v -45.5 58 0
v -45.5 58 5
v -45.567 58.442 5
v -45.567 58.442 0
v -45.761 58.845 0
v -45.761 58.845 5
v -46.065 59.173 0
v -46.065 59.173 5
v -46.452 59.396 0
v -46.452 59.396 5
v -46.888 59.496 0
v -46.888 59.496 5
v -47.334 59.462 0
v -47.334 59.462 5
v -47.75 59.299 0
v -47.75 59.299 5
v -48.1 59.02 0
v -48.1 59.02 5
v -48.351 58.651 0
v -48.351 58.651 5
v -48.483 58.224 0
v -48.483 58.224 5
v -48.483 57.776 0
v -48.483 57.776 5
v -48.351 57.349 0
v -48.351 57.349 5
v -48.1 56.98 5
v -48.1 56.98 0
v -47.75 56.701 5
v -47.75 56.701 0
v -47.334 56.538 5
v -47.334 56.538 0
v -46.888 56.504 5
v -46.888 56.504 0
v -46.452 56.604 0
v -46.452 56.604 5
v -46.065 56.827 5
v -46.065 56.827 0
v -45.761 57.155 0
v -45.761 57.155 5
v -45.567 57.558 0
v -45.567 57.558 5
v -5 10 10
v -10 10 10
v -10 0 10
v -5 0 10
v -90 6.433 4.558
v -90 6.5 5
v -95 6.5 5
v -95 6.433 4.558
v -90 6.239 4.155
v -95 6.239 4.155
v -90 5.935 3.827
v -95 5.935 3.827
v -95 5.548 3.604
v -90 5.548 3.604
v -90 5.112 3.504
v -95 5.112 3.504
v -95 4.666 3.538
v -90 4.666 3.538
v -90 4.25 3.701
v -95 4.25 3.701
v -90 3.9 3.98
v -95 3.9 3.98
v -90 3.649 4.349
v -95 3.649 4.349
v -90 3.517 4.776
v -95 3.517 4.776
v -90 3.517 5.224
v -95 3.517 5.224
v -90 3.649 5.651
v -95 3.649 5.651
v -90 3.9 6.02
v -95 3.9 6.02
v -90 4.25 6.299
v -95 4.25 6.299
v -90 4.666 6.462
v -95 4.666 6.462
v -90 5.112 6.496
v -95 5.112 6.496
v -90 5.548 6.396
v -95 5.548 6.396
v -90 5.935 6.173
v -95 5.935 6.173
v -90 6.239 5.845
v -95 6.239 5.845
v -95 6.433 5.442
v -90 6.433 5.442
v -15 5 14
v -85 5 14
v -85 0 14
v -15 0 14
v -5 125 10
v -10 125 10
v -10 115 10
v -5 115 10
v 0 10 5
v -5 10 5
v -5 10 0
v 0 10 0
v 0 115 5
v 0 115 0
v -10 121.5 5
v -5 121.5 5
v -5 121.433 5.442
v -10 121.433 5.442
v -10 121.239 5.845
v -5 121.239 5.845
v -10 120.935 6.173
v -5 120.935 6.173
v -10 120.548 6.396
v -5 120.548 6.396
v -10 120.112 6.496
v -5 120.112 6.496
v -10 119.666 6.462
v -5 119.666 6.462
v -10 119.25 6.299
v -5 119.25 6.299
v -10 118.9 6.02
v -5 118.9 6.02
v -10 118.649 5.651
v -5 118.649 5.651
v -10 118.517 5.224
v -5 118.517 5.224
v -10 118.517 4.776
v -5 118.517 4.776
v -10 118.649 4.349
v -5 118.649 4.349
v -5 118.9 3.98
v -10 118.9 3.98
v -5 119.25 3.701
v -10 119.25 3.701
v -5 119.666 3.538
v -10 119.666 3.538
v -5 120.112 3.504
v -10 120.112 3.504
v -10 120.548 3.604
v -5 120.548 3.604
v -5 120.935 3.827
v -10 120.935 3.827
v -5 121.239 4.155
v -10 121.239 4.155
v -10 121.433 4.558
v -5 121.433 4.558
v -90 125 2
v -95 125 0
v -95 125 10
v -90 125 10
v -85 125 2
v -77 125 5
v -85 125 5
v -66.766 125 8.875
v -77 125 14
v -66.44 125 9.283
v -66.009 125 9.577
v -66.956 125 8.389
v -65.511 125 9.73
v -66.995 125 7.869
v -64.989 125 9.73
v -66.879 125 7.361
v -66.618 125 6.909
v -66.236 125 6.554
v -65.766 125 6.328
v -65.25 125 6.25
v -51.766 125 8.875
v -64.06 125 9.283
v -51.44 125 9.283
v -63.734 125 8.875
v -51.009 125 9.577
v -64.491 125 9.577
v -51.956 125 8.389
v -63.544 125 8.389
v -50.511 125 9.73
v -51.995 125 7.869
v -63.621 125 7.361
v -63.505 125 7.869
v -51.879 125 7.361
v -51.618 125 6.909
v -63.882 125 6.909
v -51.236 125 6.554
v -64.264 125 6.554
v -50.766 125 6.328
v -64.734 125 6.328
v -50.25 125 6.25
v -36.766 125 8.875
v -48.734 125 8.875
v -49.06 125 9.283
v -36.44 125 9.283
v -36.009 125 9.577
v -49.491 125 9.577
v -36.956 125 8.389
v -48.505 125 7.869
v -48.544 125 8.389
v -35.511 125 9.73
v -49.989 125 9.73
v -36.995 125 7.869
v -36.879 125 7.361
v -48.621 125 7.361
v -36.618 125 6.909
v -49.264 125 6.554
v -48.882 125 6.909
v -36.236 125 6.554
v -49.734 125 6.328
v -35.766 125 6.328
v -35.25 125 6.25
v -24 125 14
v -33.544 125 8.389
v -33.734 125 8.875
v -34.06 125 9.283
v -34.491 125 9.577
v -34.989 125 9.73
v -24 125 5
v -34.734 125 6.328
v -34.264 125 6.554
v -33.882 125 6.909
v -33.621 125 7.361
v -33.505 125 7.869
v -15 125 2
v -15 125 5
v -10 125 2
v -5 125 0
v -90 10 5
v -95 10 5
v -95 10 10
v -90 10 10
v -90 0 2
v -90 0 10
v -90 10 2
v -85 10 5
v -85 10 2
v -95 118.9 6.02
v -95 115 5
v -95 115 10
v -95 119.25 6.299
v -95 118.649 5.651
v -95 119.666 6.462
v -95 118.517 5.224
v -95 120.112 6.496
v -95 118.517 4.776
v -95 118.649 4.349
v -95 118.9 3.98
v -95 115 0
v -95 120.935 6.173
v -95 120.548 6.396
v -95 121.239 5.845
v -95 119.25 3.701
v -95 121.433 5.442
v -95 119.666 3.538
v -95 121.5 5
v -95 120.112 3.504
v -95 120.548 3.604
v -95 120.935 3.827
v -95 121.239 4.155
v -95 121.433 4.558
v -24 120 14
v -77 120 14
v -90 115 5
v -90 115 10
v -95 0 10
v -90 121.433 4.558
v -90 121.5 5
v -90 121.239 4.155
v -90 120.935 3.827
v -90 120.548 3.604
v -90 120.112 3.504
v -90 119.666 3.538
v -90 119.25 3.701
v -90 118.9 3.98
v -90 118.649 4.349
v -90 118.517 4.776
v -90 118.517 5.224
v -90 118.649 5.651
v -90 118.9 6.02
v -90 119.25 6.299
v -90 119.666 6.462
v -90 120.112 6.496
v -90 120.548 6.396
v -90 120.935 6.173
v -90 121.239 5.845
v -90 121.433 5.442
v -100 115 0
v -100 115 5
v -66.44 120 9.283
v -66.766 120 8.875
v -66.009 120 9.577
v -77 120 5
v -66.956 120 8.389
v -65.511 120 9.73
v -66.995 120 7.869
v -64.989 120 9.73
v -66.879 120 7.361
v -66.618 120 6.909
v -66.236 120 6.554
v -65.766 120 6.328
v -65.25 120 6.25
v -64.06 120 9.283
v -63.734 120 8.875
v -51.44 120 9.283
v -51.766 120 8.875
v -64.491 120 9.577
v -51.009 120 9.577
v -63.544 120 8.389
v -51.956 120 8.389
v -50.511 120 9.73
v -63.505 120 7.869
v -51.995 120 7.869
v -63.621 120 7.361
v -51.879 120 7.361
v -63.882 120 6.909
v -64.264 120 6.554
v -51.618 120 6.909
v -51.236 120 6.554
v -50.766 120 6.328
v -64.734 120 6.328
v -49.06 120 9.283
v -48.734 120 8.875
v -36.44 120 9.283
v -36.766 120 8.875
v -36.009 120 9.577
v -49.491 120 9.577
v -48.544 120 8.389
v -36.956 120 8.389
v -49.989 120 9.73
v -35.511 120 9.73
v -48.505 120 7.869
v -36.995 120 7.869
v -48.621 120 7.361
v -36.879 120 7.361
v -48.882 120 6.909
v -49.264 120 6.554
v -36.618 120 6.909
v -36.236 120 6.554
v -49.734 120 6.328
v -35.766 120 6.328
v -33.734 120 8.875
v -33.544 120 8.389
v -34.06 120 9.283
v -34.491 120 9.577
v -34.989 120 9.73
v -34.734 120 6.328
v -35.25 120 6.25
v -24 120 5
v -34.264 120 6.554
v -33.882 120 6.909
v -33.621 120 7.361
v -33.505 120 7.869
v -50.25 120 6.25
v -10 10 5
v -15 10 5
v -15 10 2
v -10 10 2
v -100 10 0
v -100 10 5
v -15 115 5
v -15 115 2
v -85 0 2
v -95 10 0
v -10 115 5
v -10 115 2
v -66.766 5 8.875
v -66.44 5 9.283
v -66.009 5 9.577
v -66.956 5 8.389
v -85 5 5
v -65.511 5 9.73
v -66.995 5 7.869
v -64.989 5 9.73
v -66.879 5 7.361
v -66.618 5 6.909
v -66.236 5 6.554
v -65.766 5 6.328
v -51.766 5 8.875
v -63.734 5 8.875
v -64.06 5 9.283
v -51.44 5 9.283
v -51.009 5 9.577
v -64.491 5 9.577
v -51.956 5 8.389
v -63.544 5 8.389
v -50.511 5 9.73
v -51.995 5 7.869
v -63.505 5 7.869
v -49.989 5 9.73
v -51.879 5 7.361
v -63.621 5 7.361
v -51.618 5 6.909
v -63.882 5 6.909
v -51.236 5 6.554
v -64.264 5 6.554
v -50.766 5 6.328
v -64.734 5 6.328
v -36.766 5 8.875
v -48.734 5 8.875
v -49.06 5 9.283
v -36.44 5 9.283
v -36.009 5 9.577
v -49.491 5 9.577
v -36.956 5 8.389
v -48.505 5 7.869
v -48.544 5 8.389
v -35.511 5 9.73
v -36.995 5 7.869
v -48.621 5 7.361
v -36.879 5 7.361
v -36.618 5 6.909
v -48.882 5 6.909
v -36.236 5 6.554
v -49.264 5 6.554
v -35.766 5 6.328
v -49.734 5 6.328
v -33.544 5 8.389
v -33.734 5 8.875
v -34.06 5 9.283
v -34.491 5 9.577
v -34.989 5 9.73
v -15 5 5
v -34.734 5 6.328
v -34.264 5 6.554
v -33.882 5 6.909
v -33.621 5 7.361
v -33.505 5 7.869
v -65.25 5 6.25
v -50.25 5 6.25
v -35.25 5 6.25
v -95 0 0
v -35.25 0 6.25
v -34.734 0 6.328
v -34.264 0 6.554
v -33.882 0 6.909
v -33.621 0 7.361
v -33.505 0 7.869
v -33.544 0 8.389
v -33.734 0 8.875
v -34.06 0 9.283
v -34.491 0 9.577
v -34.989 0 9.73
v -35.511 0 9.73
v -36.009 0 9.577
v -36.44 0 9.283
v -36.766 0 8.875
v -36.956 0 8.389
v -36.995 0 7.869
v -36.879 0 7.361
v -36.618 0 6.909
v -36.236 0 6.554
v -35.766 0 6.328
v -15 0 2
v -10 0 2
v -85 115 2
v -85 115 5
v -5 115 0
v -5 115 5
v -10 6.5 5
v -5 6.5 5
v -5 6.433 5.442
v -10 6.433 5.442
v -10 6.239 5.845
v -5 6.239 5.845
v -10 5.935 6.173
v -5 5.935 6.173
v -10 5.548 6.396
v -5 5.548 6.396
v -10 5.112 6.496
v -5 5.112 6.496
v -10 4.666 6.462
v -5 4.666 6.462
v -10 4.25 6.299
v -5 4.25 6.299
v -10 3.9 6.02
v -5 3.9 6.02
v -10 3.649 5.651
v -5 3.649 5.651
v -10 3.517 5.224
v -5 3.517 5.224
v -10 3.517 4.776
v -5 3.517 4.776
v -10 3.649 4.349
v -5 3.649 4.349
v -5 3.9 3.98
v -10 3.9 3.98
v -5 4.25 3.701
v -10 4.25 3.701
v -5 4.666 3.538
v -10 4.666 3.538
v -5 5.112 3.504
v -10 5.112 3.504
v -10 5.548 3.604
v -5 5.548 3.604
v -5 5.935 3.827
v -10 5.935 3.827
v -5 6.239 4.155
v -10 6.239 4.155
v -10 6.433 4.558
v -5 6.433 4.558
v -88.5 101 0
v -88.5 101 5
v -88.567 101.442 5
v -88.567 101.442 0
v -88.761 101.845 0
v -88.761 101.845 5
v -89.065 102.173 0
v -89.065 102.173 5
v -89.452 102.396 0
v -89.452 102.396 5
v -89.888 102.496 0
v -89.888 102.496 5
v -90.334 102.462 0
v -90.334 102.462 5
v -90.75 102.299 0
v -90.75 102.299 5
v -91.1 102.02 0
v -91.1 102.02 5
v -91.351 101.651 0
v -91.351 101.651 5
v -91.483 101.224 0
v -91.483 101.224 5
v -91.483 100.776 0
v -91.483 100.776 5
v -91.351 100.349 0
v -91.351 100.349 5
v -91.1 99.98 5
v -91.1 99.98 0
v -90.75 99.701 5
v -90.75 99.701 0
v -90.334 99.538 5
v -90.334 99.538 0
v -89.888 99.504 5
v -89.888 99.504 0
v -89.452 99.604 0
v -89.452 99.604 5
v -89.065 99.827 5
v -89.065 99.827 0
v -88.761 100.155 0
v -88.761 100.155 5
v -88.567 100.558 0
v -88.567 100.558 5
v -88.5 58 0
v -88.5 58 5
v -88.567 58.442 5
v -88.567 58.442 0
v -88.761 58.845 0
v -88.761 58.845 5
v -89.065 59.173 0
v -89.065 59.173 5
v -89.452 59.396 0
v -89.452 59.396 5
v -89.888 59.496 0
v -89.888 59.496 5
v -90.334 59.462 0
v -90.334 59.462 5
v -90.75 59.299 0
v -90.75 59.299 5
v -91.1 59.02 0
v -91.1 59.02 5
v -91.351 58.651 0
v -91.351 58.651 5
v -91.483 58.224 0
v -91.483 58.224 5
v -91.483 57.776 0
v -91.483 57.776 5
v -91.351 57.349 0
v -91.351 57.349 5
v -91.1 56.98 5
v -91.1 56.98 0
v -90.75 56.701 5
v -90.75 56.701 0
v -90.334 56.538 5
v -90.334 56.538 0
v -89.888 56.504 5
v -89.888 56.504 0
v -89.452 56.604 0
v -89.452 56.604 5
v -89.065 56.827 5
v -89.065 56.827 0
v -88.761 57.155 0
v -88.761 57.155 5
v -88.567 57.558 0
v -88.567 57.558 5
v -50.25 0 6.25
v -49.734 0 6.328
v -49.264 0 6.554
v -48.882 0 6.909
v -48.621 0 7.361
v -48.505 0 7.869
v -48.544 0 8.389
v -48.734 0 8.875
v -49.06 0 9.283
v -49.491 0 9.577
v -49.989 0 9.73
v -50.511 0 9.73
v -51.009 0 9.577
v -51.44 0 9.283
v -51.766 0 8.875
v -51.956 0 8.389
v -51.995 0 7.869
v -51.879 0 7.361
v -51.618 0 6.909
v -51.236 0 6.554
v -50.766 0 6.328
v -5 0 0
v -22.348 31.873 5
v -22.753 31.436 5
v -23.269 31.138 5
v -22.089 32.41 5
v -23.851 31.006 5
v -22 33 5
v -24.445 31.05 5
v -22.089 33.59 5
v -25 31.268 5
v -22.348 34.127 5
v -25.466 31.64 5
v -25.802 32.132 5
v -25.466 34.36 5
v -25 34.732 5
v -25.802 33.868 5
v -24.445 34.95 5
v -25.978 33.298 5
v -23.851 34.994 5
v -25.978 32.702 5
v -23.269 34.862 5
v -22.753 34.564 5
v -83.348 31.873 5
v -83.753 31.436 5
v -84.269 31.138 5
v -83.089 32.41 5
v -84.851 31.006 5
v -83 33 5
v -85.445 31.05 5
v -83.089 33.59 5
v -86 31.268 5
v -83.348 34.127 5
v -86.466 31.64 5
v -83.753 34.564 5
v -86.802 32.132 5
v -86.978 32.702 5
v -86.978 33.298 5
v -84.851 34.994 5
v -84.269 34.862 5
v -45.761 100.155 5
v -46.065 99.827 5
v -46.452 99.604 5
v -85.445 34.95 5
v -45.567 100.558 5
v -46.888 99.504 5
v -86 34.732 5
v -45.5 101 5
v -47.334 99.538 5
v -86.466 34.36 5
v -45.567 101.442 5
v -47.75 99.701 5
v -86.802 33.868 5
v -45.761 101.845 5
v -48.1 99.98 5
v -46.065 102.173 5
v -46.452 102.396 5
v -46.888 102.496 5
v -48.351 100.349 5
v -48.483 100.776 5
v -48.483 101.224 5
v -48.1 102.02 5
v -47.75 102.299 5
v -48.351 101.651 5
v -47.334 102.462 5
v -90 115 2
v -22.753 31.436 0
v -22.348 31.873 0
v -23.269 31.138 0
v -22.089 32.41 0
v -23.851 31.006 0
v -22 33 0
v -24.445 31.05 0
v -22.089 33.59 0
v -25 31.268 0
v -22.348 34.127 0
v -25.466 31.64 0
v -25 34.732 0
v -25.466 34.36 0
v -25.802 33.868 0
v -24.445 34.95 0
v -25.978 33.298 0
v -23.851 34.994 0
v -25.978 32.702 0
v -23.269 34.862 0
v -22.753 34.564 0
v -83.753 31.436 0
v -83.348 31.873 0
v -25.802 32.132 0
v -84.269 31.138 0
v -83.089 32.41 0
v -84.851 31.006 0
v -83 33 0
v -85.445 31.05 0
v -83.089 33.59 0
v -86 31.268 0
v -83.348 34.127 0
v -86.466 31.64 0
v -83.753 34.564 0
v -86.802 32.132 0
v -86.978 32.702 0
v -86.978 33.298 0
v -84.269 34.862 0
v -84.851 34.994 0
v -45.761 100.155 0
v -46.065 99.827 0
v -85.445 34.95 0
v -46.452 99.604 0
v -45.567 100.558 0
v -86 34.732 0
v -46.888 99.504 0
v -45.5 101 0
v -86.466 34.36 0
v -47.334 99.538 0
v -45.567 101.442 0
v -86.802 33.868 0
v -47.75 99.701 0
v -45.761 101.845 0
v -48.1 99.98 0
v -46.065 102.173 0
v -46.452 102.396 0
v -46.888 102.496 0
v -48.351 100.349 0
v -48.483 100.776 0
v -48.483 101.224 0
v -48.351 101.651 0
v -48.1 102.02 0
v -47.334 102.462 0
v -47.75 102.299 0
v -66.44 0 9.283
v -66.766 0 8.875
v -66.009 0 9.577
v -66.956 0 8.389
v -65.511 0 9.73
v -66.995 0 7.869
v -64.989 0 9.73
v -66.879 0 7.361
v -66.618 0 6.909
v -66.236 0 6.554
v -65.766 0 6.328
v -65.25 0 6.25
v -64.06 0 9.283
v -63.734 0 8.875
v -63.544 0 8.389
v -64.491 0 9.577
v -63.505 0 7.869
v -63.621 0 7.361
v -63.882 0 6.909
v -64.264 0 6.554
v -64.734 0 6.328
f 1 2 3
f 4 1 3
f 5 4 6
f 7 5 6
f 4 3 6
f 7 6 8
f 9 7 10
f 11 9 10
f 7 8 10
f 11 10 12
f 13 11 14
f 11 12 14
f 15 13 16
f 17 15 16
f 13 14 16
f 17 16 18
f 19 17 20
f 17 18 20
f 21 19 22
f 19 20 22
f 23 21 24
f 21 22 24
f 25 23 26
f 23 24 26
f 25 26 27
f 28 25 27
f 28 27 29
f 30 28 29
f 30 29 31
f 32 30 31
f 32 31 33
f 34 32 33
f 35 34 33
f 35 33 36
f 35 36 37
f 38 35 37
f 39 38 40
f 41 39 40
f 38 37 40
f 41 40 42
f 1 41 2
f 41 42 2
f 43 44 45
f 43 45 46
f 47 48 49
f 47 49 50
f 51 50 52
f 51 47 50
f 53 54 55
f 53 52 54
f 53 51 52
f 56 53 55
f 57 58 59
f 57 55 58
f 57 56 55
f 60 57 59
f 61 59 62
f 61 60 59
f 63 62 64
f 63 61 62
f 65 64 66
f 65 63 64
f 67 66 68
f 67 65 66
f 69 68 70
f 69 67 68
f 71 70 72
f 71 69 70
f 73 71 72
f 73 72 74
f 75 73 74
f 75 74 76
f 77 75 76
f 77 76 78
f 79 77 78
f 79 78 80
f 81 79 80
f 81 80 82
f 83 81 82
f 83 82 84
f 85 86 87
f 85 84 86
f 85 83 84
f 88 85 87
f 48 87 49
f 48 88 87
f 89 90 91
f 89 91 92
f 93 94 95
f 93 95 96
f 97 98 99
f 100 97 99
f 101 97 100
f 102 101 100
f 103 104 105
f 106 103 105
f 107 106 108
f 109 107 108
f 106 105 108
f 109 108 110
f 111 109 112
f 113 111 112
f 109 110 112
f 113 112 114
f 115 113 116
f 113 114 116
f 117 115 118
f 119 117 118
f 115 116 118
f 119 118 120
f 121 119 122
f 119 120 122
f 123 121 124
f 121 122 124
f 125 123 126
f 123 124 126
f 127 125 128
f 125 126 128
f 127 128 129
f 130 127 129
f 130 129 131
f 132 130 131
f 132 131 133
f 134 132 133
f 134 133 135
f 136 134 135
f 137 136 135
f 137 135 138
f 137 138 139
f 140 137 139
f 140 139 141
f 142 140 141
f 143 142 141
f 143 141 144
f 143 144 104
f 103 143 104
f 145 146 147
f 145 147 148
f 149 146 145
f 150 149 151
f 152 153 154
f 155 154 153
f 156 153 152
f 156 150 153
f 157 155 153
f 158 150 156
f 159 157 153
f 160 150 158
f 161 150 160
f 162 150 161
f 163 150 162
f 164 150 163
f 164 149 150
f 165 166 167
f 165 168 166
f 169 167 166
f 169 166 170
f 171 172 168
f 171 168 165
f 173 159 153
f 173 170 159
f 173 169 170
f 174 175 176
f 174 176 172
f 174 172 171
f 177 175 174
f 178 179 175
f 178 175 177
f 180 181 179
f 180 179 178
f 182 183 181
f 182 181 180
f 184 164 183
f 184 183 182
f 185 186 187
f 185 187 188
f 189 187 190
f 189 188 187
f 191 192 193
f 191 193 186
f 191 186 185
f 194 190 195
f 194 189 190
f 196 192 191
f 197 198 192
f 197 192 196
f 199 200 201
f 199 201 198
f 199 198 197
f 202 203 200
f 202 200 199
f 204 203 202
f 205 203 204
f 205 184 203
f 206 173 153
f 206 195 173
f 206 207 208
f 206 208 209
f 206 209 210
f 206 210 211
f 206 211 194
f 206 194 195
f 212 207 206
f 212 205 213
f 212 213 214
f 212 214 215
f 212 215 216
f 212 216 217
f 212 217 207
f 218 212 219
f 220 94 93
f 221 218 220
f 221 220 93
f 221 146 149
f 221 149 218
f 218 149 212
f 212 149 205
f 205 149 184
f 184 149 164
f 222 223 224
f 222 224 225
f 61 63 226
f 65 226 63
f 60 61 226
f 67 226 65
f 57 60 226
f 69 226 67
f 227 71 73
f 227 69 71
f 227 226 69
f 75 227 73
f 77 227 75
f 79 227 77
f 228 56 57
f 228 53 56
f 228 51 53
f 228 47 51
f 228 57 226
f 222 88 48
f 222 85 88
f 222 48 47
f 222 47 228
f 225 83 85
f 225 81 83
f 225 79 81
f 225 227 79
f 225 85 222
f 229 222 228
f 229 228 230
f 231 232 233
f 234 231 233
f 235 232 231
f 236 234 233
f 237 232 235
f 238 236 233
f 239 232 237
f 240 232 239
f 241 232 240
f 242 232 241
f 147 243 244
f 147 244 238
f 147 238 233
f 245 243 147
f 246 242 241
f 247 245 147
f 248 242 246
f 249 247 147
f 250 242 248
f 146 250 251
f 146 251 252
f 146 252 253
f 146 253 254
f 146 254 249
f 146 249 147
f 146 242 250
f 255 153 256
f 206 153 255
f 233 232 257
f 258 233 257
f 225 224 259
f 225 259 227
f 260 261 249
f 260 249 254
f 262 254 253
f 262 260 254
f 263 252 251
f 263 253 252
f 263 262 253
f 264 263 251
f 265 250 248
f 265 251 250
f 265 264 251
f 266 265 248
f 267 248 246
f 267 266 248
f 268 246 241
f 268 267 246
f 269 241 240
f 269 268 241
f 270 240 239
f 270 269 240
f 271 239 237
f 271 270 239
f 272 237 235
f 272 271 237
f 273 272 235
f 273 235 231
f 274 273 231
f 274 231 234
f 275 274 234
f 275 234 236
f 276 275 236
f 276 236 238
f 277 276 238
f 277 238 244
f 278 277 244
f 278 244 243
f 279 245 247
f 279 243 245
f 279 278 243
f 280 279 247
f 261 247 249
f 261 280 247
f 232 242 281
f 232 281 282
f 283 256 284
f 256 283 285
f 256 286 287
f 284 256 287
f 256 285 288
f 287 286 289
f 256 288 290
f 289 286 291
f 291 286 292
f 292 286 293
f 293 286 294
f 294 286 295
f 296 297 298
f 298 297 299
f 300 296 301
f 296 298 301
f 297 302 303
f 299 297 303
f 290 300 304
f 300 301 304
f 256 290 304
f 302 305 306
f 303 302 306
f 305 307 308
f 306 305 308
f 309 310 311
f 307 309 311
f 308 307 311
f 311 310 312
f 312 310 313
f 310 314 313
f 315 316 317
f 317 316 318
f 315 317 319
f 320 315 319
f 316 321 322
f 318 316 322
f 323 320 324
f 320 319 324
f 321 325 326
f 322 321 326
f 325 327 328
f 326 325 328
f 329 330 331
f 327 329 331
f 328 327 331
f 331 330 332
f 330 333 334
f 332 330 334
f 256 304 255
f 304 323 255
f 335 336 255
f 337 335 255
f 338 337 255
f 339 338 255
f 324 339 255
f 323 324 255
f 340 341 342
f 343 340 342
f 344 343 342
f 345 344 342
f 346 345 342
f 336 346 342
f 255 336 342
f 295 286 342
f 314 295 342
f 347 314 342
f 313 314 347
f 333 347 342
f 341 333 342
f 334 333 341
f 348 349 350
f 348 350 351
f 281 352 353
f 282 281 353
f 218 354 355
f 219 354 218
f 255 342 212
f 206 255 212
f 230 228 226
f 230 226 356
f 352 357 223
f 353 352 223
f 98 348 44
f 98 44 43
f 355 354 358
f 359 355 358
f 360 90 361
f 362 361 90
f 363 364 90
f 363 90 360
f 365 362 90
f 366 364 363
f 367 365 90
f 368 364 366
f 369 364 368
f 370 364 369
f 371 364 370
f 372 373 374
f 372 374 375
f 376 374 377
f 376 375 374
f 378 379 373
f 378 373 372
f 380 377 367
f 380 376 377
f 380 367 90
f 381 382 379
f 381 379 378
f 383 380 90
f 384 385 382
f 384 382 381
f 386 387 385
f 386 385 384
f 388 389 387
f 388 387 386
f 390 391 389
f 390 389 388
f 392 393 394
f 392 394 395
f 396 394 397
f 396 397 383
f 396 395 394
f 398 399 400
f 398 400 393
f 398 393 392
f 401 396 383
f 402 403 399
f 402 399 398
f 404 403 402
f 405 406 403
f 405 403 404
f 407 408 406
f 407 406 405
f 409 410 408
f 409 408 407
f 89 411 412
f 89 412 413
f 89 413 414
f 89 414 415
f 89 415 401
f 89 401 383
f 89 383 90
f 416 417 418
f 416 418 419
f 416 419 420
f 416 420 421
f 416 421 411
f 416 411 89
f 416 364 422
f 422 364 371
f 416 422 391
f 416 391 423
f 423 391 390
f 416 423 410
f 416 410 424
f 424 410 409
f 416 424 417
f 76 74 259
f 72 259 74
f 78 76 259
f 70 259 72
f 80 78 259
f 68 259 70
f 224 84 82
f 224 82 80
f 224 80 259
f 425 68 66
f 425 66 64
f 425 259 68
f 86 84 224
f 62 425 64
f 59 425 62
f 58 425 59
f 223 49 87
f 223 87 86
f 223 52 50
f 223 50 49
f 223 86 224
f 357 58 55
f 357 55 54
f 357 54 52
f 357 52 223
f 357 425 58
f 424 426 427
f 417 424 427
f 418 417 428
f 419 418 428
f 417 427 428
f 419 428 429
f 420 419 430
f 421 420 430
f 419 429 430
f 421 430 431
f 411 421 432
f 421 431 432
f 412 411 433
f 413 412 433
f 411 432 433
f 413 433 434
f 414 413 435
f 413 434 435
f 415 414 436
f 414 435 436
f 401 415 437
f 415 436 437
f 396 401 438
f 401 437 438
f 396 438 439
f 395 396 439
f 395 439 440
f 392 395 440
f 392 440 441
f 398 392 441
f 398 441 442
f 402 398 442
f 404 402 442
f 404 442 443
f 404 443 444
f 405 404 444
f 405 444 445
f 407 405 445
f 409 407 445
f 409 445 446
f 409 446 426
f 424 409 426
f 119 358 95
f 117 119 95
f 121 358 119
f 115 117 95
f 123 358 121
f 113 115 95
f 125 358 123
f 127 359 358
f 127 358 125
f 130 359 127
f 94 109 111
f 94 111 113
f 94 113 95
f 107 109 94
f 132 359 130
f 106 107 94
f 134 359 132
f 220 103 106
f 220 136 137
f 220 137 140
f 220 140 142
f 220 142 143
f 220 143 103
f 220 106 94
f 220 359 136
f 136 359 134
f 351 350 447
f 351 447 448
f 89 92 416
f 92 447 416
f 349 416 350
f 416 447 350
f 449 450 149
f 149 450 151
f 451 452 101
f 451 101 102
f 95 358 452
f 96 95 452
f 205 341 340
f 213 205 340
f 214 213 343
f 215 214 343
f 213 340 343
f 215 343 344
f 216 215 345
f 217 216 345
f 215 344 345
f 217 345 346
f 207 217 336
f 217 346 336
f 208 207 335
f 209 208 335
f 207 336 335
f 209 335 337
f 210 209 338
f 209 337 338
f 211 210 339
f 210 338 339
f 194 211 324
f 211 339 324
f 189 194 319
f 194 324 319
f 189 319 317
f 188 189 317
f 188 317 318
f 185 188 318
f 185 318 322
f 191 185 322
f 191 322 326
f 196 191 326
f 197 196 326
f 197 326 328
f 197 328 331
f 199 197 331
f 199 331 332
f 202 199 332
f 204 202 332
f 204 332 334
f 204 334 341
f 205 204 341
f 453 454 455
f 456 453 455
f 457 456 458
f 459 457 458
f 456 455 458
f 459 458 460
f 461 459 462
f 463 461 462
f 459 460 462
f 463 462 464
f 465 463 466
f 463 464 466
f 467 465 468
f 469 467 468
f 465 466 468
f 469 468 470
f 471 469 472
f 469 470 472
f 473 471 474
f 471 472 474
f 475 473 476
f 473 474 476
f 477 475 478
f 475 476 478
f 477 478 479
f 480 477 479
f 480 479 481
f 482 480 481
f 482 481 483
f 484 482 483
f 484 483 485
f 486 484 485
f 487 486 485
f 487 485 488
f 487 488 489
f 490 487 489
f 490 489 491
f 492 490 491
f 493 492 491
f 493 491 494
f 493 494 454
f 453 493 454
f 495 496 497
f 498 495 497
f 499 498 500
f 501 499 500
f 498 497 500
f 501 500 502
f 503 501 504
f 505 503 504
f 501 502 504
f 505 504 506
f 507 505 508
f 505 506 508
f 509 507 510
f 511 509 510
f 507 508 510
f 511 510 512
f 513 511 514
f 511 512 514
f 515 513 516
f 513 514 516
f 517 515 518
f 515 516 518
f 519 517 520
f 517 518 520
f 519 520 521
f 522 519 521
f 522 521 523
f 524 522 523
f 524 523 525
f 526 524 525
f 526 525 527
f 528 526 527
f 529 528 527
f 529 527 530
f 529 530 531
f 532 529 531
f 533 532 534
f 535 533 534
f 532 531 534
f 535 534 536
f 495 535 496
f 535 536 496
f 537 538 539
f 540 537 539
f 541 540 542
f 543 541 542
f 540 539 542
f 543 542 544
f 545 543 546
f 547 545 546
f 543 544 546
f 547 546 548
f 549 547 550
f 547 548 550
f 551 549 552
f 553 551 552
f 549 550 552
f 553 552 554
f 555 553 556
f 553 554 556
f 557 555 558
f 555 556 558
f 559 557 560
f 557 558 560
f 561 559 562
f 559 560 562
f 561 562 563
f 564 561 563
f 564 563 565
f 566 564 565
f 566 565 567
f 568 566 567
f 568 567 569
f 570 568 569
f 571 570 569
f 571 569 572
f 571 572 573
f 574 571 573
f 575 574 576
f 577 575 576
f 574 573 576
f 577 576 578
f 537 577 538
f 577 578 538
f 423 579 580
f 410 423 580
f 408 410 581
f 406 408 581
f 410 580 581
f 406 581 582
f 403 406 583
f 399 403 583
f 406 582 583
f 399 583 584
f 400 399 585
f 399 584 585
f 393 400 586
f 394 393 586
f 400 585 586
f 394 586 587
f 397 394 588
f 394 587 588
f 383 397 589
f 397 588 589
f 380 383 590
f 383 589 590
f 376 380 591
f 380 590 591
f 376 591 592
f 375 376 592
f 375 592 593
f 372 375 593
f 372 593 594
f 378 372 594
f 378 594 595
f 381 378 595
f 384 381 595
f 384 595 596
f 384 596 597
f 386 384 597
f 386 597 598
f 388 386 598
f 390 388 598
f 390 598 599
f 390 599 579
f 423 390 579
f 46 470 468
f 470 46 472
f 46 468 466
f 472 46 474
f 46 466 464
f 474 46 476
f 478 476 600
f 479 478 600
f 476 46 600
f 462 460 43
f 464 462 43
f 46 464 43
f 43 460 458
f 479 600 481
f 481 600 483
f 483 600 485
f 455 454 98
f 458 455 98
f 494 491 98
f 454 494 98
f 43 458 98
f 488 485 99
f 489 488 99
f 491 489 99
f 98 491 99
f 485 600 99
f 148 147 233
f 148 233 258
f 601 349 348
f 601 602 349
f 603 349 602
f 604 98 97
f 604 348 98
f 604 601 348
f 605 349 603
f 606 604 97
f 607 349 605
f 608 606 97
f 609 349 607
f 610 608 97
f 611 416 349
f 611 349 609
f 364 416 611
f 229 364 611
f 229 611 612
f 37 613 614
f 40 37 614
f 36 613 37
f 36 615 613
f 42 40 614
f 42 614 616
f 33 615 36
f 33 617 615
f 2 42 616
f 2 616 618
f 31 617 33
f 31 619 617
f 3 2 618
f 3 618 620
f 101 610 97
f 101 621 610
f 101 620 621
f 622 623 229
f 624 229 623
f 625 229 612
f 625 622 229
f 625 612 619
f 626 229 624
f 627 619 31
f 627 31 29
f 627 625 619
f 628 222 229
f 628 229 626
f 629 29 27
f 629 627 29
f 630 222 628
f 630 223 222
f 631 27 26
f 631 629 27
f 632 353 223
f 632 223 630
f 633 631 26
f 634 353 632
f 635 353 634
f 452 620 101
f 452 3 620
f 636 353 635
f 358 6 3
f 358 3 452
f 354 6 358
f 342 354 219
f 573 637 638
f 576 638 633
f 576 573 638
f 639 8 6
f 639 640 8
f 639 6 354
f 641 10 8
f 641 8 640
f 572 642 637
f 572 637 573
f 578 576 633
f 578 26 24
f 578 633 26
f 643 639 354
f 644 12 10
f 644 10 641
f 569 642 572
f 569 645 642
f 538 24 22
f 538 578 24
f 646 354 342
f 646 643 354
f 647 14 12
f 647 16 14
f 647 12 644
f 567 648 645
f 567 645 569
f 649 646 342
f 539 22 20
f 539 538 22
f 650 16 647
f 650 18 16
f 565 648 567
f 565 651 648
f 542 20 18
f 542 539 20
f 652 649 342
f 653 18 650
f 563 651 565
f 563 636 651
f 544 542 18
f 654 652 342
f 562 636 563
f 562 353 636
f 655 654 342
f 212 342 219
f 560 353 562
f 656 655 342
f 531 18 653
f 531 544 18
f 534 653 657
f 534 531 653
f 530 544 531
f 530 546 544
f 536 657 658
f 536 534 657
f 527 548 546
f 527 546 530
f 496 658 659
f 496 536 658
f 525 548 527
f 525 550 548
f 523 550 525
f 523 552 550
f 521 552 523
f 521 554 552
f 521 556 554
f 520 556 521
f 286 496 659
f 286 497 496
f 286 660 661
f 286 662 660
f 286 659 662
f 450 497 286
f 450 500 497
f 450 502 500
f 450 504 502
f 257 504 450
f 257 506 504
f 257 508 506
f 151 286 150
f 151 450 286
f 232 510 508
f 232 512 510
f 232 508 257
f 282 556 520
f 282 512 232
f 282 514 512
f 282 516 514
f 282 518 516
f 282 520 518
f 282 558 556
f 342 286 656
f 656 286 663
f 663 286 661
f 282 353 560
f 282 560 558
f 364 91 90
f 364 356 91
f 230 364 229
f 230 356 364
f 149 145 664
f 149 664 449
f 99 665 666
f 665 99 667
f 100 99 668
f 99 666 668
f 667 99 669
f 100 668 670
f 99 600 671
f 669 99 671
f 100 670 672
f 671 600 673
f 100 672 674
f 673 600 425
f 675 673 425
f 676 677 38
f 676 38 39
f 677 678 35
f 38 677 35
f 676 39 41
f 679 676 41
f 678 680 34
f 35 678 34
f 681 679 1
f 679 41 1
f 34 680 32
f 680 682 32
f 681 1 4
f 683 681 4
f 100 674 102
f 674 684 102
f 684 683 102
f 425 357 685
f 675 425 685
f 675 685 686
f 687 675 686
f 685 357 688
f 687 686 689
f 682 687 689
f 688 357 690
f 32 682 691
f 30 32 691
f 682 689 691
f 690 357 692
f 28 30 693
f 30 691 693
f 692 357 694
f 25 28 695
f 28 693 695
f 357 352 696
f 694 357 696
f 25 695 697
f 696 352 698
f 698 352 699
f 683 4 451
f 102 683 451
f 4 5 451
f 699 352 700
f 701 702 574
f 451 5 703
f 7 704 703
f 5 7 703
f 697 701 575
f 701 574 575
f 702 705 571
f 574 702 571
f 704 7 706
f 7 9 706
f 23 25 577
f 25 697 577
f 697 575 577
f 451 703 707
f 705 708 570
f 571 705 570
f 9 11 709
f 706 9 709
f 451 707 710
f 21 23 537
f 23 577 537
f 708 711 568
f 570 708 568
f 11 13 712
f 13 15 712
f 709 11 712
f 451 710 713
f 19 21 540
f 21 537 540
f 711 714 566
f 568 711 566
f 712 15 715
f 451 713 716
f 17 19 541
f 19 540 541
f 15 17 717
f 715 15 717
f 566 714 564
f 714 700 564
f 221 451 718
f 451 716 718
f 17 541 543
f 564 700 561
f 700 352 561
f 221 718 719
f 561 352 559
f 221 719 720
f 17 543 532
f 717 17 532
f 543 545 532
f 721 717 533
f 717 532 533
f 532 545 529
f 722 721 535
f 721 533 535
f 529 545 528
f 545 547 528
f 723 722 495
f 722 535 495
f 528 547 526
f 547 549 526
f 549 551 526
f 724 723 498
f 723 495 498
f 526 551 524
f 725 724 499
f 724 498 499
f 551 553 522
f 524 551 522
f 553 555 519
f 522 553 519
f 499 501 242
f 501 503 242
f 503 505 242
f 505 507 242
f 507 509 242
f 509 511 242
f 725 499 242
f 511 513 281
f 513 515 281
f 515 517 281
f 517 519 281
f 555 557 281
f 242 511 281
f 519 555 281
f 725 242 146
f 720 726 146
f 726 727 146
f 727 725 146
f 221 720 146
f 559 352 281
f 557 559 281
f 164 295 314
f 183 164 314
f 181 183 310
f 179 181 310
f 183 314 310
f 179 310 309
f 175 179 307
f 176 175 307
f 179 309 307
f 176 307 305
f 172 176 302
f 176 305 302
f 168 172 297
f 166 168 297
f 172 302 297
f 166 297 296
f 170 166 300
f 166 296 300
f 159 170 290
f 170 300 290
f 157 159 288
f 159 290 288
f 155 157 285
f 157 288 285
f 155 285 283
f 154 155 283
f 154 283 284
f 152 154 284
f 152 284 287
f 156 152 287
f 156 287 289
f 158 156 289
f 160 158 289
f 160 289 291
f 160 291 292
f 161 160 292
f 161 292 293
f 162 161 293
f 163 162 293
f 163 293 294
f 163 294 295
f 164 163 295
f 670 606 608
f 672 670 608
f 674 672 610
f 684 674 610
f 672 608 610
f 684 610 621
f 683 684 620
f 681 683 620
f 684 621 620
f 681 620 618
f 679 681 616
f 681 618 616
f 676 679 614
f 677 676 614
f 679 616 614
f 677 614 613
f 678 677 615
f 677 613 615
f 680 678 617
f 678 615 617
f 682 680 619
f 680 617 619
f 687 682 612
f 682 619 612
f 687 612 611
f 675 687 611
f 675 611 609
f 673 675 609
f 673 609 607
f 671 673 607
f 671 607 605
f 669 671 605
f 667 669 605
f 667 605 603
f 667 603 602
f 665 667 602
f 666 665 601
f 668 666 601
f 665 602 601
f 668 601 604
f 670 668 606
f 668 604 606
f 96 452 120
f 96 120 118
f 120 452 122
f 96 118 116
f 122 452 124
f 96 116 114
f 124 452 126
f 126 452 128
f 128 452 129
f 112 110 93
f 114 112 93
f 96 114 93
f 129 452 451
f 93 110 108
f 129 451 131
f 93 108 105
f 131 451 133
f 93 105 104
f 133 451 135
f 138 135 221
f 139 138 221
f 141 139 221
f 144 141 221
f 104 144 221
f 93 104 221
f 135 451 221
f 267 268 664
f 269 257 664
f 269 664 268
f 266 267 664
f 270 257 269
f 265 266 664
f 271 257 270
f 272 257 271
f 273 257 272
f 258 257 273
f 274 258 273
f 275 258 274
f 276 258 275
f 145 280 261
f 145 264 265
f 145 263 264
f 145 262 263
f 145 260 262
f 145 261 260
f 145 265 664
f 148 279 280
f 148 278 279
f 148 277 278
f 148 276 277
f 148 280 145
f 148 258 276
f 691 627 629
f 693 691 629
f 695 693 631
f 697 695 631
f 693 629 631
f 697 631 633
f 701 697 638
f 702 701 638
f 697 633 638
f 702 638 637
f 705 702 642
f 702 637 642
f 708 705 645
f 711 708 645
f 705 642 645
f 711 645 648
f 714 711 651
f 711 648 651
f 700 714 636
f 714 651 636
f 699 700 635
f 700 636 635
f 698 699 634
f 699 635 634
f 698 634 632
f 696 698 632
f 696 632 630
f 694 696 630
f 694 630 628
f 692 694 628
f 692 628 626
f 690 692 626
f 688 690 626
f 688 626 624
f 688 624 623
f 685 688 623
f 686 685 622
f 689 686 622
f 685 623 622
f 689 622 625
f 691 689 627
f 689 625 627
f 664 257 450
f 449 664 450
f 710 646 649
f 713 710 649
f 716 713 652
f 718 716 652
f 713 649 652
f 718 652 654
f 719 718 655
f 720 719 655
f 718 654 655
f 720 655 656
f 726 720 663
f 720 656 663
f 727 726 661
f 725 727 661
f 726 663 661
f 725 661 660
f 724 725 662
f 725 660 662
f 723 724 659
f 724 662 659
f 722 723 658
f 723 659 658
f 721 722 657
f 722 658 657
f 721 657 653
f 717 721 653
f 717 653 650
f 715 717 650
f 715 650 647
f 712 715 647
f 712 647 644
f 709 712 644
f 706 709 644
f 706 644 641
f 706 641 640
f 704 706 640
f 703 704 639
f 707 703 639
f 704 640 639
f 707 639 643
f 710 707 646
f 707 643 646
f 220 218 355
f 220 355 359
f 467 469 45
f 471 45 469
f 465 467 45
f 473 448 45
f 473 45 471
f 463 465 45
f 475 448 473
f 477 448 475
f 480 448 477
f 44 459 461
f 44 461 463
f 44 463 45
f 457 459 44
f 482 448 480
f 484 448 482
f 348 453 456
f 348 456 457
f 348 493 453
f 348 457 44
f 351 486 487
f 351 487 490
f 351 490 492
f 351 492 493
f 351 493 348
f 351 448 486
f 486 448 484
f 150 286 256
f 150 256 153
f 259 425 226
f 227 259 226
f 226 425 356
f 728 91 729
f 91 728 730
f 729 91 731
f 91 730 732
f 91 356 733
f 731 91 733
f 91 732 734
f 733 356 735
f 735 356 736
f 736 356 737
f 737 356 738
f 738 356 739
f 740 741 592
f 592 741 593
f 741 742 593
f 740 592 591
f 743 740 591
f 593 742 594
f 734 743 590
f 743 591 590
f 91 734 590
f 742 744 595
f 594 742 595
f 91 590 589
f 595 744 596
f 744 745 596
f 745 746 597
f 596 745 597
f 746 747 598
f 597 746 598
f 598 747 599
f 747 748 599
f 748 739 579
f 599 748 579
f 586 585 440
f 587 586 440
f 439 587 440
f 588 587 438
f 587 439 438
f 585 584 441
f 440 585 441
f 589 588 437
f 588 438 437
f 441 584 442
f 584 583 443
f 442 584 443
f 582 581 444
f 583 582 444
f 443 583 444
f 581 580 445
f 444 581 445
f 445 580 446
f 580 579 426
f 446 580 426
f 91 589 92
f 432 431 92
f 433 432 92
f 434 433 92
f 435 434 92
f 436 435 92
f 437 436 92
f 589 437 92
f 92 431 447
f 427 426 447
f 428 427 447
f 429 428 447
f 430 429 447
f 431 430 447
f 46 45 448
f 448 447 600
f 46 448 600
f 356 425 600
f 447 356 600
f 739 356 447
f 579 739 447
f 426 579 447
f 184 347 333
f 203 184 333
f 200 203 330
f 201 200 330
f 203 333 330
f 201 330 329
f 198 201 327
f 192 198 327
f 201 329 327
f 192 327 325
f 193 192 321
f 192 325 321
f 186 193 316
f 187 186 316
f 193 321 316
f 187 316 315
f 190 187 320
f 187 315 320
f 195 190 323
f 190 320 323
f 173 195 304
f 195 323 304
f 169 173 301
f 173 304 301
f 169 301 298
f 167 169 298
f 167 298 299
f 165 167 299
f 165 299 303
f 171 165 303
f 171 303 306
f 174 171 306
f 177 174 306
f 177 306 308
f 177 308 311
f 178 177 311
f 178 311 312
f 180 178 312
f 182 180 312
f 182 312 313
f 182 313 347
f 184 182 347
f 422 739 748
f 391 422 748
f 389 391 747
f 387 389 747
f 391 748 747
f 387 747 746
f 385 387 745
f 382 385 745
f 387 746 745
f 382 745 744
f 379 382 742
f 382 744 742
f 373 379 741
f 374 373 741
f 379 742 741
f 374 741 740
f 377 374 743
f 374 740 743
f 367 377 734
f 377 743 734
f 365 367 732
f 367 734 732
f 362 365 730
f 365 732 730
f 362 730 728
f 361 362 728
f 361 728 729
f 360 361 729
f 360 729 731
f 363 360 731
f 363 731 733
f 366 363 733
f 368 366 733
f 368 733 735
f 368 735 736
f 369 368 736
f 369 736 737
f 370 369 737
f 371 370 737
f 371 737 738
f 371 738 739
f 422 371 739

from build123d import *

# Parameters (mm, degrees)
SKETCH1_W           = 90
SKETCH1_H           = 125
BOSS_EXTRUDE1_DEPTH = 5
SKETCH2_W           = 5
SKETCH2_H           = 105
BOSS_EXTRUDE2_DEPTH = 5
SKETCH3_W           = 5
SKETCH3_H           = 10
BOSS_EXTRUDE3_DEPTH = 5
SKETCH4_W           = 5
SKETCH4_H           = 10
CUT_EXTRUDE1_DEPTH  = 3
SKETCH5_R           = 1.5
CUT_EXTRUDE2_DEPTH  = 15
CUT_EXTRUDE3_START  = -15
SKETCH6_R           = 1.5
CUT_EXTRUDE3_DEPTH  = 15
SKETCH7_W           = 53
SKETCH7_H           = 5
SKETCH7_W_2         = 70
BOSS_EXTRUDE4_DEPTH = 9
CUT_EXTRUDE4_REACH  = 162.689
SKETCH8_R           = 1.75
SKETCH9_R           = 1.5
CUT_EXTRUDE5_DEPTH  = 5
SKETCH10_R          = 2
CUT_EXTRUDE6_DEPTH  = 5
SKETCH11_W          = 5
SKETCH11_H          = 105
BOSS_EXTRUDE5_DEPTH = 5


with BuildPart() as part:
    # Sketch1 → Boss-Extrude1 (new body)
    with BuildSketch(Plane.XY):
        with Locations((-50, 62.5)):
            Rectangle(SKETCH1_W, SKETCH1_H)
    extrude(amount=BOSS_EXTRUDE1_DEPTH)

    # Sketch2 → Boss-Extrude2 (add)
    with BuildSketch(Plane.ZY.offset(95)):
        with Locations((2.5, 62.5)):
            Rectangle(SKETCH2_W, SKETCH2_H)
    extrude(amount=BOSS_EXTRUDE2_DEPTH)

    # Sketch3 → Boss-Extrude3 (add)
    with BuildSketch(Plane.XY.offset(5)):
        with Locations((-7.5, 120)):
            Rectangle(SKETCH3_W, SKETCH3_H)
        with Locations((-92.5, 120)):
            Rectangle(SKETCH3_W, SKETCH3_H)
        with Locations((-7.5, 5)):
            Rectangle(SKETCH3_W, SKETCH3_H)
        with Locations((-92.5, 5)):
            Rectangle(SKETCH3_W, SKETCH3_H)
    extrude(amount=BOSS_EXTRUDE3_DEPTH)

    # Sketch4 → Cut-Extrude1 (cut)
    with BuildSketch(Plane.XY.offset(5)):
        with Locations((-87.5, 120)):
            Rectangle(SKETCH4_W, SKETCH4_H)
        with Locations((-12.5, 120)):
            Rectangle(SKETCH4_W, SKETCH4_H)
        with Locations((-12.5, 5)):
            Rectangle(SKETCH4_W, SKETCH4_H)
        with Locations((-87.5, 5)):
            Rectangle(SKETCH4_W, SKETCH4_H)
    extrude(amount=-CUT_EXTRUDE1_DEPTH, mode=Mode.SUBTRACT)

    # Sketch5 → Cut-Extrude2 (cut)
    with BuildSketch(Plane(origin=(0, 0, 0), x_dir=(0, 0, -1), z_dir=(1, 0, 0))):
        with Locations(Location((-5, 5, 0), (0, 0, 90))):
            Circle(SKETCH5_R)
        with Locations(Location((-5, 120, 0), (0, 0, 90))):
            Circle(SKETCH5_R)
    extrude(amount=-CUT_EXTRUDE2_DEPTH, mode=Mode.SUBTRACT)

    # Sketch6 → Cut-Extrude3 (cut)
    with BuildSketch(Plane.ZY.offset(100).offset(CUT_EXTRUDE3_START)):
        with Locations(Location((5, 5, 0), (0, 0, 90))):
            Circle(SKETCH6_R)
        with Locations(Location((5, 120, 0), (0, 0, 90))):
            Circle(SKETCH6_R)
    extrude(amount=CUT_EXTRUDE3_DEPTH, mode=Mode.SUBTRACT)

    # Sketch7 → Boss-Extrude4 (add)
    with BuildSketch(Plane.XY.offset(5)):
        with Locations((-50.5, 122.5)):
            Rectangle(SKETCH7_W, SKETCH7_H)
        with Locations((-50, 2.5)):
            Rectangle(SKETCH7_W_2, SKETCH7_H)
    extrude(amount=BOSS_EXTRUDE4_DEPTH)

    # Cut-Extrude4: up to this face of the body (flat: up to its plane)
    cut_extrude4_end = Plane(part.part.faces().sort_by_distance((-50.251847941, 125, 6.258183738))[0])
    # Sketch8 → Cut-Extrude4 (cut, up to the picked face)
    with BuildSketch(Plane.XZ, mode=Mode.PRIVATE) as cut_extrude4_sk1:
        with Locations(Location((-65.25, 8, 0), (0, 0, 270))):
            Circle(SKETCH8_R)
    cut_extrude4_tool1 = split(extrude(cut_extrude4_sk1.sketch, amount=-CUT_EXTRUDE4_REACH, mode=Mode.PRIVATE), bisect_by=cut_extrude4_end, keep=Keep.BOTH, mode=Mode.PRIVATE)
    # Sketch8 → Cut-Extrude4 (cut, up to the picked face)
    with BuildSketch(Plane.XZ, mode=Mode.PRIVATE) as cut_extrude4_sk2:
        with Locations(Location((-50.25, 8, 0), (0, 0, 270))):
            Circle(SKETCH8_R)
    cut_extrude4_tool2 = split(extrude(cut_extrude4_sk2.sketch, amount=-CUT_EXTRUDE4_REACH, mode=Mode.PRIVATE), bisect_by=cut_extrude4_end, keep=Keep.BOTH, mode=Mode.PRIVATE)
    # Sketch8 → Cut-Extrude4 (cut, up to the picked face)
    with BuildSketch(Plane.XZ, mode=Mode.PRIVATE) as cut_extrude4_sk3:
        with Locations(Location((-35.25, 8, 0), (0, 0, 270))):
            Circle(SKETCH8_R)
    cut_extrude4_tool3 = split(extrude(cut_extrude4_sk3.sketch, amount=-CUT_EXTRUDE4_REACH, mode=Mode.PRIVATE), bisect_by=cut_extrude4_end, keep=Keep.BOTH, mode=Mode.PRIVATE)
    add(cut_extrude4_tool1.solids().sort_by(Axis((-65.25, 0, 8), (0, 1, 0)))[0], mode=Mode.SUBTRACT)
    add(cut_extrude4_tool2.solids().sort_by(Axis((-50.25, 0, 8), (0, 1, 0)))[0], mode=Mode.SUBTRACT)
    add(cut_extrude4_tool3.solids().sort_by(Axis((-35.25, 0, 8), (0, 1, 0)))[0], mode=Mode.SUBTRACT)

    # Sketch9 → Cut-Extrude5 (cut)
    with BuildSketch(Plane.XY.offset(5)):
        with Locations((-47, 101)):
            Circle(SKETCH9_R)
        with Locations((-90, 101)):
            Circle(SKETCH9_R)
        with Locations((-90, 58)):
            Circle(SKETCH9_R)
        with Locations((-47, 58)):
            Circle(SKETCH9_R)
    extrude(amount=-CUT_EXTRUDE5_DEPTH, mode=Mode.SUBTRACT)

    # Sketch10 → Cut-Extrude6 (cut)
    with BuildSketch(Plane.XY.offset(5)):
        with Locations((-85, 33)):
            Circle(SKETCH10_R)
        with Locations((-24, 33)):
            Circle(SKETCH10_R)
    extrude(amount=-CUT_EXTRUDE6_DEPTH, mode=Mode.SUBTRACT)

    # Sketch11 → Boss-Extrude5 (add)
    with BuildSketch(Plane(origin=(-5, 0, 0), x_dir=(0, 0, -1), z_dir=(1, 0, 0))):
        with Locations((-2.5, 62.5)):
            Rectangle(SKETCH11_W, SKETCH11_H)
    extrude(amount=BOSS_EXTRUDE5_DEPTH)


solid = part.part
